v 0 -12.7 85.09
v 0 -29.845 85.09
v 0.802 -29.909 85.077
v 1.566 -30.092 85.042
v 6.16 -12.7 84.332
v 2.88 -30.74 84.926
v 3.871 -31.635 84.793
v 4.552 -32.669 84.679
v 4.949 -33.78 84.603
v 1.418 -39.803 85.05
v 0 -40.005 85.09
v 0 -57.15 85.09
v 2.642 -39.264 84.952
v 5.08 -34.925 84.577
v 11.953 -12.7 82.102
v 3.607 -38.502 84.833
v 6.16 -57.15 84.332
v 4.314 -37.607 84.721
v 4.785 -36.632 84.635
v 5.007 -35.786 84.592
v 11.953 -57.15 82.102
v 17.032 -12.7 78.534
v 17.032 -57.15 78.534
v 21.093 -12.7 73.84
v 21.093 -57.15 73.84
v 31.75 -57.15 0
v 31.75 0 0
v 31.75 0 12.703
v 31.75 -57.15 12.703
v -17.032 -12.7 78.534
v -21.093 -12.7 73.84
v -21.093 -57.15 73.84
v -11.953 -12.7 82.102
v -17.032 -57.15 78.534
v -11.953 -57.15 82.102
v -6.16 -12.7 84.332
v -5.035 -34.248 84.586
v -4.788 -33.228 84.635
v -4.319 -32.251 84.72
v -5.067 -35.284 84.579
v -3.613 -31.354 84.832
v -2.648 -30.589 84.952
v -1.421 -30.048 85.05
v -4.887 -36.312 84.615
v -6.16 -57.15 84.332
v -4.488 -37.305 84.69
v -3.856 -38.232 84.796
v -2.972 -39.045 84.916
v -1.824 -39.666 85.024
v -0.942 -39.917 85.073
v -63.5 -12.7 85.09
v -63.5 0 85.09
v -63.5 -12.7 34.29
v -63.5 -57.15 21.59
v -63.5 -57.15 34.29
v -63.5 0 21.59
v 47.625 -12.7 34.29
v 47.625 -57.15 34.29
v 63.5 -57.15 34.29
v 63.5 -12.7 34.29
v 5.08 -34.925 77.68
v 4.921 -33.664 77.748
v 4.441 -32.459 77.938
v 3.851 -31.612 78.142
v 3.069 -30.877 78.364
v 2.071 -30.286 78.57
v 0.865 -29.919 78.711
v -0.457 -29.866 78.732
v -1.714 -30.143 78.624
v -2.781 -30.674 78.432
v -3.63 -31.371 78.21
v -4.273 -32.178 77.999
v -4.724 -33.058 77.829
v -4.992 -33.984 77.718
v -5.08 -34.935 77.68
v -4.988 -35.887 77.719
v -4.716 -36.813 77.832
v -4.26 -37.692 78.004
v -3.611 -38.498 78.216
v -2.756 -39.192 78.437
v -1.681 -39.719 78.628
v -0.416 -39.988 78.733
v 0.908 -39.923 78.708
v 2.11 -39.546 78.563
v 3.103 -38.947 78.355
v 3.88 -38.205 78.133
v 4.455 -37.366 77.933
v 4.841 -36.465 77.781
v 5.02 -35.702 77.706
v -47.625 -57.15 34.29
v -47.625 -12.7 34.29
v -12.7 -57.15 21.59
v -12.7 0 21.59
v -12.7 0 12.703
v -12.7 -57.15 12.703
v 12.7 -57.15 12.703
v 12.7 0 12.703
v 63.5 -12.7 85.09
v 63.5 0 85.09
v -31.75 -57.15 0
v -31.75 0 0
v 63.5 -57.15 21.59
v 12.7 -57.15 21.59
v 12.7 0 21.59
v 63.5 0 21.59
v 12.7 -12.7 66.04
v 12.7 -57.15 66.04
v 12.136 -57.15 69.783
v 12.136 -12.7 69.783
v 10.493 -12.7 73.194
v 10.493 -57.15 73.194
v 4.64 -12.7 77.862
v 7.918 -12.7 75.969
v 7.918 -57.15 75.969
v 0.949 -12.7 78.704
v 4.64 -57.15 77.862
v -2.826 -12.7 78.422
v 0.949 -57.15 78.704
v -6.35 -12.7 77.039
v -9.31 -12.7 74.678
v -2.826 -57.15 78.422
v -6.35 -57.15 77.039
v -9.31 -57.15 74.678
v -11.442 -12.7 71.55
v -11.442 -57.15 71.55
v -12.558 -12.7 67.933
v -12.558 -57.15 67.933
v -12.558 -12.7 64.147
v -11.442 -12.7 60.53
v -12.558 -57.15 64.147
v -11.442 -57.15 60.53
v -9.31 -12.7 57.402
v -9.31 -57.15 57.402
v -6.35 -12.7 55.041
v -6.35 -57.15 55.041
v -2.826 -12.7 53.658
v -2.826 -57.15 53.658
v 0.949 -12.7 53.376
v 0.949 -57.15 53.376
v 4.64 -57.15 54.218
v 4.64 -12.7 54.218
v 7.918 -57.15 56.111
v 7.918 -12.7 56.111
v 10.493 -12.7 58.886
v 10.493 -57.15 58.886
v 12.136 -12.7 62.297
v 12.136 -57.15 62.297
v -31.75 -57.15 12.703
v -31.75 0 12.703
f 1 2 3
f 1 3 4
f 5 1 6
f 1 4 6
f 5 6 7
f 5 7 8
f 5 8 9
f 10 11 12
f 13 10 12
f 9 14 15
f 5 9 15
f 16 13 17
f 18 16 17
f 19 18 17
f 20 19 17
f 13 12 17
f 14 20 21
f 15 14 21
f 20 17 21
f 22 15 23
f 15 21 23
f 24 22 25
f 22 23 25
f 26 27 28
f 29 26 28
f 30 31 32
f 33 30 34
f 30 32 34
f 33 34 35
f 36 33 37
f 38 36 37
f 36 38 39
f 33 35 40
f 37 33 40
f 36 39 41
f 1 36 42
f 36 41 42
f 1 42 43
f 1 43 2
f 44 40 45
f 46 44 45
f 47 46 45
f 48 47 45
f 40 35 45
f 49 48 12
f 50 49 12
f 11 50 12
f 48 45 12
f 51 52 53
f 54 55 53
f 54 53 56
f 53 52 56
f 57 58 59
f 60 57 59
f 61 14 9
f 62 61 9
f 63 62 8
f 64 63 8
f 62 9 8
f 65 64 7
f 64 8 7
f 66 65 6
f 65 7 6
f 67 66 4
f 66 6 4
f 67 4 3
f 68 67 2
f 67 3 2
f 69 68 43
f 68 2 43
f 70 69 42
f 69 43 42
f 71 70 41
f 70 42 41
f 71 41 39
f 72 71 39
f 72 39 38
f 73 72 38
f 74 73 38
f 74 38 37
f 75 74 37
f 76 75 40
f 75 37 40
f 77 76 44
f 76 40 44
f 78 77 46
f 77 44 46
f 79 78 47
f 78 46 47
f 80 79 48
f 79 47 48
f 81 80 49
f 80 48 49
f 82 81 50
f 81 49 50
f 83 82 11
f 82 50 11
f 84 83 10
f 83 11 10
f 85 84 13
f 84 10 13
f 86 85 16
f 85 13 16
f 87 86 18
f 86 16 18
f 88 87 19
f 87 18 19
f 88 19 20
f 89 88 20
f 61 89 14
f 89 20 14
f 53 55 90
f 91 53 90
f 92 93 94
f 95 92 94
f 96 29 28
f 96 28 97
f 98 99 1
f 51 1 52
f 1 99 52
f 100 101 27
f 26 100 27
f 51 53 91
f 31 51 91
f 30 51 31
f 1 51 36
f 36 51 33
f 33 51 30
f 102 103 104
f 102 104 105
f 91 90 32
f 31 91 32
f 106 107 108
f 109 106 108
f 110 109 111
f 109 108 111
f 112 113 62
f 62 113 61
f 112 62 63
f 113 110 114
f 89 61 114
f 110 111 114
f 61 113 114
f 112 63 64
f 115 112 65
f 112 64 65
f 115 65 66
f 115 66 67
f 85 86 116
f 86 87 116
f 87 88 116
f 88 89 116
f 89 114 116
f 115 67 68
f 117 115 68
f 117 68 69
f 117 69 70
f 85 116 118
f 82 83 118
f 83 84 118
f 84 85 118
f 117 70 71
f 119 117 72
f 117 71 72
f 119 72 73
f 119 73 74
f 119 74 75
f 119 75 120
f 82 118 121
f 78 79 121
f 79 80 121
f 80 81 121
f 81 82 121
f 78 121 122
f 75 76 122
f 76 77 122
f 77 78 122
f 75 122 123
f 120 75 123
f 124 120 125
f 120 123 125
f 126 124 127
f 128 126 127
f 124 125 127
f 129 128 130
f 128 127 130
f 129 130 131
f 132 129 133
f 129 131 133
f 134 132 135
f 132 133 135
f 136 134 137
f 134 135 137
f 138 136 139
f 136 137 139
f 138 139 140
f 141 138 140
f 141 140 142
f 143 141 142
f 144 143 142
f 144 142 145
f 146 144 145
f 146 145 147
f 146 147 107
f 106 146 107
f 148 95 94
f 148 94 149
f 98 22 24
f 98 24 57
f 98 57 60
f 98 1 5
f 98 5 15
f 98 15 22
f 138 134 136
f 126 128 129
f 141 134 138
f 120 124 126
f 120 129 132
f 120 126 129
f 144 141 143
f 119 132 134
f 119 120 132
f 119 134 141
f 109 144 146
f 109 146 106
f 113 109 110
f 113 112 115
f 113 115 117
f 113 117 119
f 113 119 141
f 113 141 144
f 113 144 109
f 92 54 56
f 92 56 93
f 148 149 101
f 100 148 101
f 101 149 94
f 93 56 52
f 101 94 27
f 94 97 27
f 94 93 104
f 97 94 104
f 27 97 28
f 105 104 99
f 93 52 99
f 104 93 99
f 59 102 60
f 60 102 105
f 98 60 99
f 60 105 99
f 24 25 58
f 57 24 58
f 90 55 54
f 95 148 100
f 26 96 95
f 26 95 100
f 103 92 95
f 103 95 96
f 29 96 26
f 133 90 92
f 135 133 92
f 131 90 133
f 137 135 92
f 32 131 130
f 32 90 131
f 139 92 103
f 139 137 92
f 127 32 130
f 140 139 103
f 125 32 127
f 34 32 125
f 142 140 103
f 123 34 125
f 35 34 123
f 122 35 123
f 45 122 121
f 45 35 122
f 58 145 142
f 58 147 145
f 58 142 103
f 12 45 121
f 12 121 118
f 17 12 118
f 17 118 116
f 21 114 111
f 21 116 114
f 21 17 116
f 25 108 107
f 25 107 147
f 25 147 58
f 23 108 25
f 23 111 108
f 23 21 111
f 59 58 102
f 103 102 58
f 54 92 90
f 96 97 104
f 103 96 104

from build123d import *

# Parameters (mm, degrees)
F1_DEPTH = 57.15
F3_DEPTH = 44.45
F4_R     = 12.7
F5_DEPTH = 44.45
F6_R     = 5.08
F7_DEPTH = 25.4


with BuildPart() as f1:
    # F0 (on Front) → F1 (new body)
    with BuildSketch(Plane.XZ):
        Polygon((-31.75, 0), (0, 0), (31.75, 0), (31.75, 12.70301), (12.7, 12.70301), (12.7, 21.59), (63.5, 21.59), (63.5, 85.09), (0, 85.09), (-63.5, 85.09), (-63.5, 21.59), (-12.7, 21.59), (-12.7, 12.70301), (-31.75, 12.70301), align=None)
    extrude(amount=F1_DEPTH)

    # F2 (on face) → F3 (cut)
    with BuildSketch(Plane.XZ.offset(57.15)):
        with BuildLine():
            Line((-63.5, 85.09), (-63.5, 34.29))
            Line((-63.5, 34.29), (-47.625, 34.29))
            Line((-47.625, 34.29), (-21.093426, 73.840173))
            ThreePointArc((-21.093426, 73.840173), (-11.952941, 82.101765), (0, 85.09))
            Line((0, 85.09), (-63.5, 85.09))
        make_face()
        with BuildLine():
            Line((63.5, 85.09), (0, 85.09))
            ThreePointArc((0, 85.09), (11.952941, 82.101765), (21.093426, 73.840173))
            Line((21.093426, 73.840173), (47.625, 34.29))
            Line((47.625, 34.29), (63.5, 34.29))
            Line((63.5, 34.29), (63.5, 85.09))
        make_face()
    extrude(amount=-F3_DEPTH, mode=Mode.SUBTRACT)

    # F4 (on face) → F5 (cut)
    with BuildSketch(Plane.XZ.offset(57.15)):
        with Locations((0, 66.04)):
            Circle(F4_R)
    extrude(amount=-F5_DEPTH, mode=Mode.SUBTRACT)

    # F6 (on face) → F7 (cut)
    with BuildSketch(Plane.XY.offset(85.09)):
        with Locations((0, -34.925)):
            Circle(F6_R)
    extrude(amount=-F7_DEPTH, mode=Mode.SUBTRACT)


solid = f1.part
